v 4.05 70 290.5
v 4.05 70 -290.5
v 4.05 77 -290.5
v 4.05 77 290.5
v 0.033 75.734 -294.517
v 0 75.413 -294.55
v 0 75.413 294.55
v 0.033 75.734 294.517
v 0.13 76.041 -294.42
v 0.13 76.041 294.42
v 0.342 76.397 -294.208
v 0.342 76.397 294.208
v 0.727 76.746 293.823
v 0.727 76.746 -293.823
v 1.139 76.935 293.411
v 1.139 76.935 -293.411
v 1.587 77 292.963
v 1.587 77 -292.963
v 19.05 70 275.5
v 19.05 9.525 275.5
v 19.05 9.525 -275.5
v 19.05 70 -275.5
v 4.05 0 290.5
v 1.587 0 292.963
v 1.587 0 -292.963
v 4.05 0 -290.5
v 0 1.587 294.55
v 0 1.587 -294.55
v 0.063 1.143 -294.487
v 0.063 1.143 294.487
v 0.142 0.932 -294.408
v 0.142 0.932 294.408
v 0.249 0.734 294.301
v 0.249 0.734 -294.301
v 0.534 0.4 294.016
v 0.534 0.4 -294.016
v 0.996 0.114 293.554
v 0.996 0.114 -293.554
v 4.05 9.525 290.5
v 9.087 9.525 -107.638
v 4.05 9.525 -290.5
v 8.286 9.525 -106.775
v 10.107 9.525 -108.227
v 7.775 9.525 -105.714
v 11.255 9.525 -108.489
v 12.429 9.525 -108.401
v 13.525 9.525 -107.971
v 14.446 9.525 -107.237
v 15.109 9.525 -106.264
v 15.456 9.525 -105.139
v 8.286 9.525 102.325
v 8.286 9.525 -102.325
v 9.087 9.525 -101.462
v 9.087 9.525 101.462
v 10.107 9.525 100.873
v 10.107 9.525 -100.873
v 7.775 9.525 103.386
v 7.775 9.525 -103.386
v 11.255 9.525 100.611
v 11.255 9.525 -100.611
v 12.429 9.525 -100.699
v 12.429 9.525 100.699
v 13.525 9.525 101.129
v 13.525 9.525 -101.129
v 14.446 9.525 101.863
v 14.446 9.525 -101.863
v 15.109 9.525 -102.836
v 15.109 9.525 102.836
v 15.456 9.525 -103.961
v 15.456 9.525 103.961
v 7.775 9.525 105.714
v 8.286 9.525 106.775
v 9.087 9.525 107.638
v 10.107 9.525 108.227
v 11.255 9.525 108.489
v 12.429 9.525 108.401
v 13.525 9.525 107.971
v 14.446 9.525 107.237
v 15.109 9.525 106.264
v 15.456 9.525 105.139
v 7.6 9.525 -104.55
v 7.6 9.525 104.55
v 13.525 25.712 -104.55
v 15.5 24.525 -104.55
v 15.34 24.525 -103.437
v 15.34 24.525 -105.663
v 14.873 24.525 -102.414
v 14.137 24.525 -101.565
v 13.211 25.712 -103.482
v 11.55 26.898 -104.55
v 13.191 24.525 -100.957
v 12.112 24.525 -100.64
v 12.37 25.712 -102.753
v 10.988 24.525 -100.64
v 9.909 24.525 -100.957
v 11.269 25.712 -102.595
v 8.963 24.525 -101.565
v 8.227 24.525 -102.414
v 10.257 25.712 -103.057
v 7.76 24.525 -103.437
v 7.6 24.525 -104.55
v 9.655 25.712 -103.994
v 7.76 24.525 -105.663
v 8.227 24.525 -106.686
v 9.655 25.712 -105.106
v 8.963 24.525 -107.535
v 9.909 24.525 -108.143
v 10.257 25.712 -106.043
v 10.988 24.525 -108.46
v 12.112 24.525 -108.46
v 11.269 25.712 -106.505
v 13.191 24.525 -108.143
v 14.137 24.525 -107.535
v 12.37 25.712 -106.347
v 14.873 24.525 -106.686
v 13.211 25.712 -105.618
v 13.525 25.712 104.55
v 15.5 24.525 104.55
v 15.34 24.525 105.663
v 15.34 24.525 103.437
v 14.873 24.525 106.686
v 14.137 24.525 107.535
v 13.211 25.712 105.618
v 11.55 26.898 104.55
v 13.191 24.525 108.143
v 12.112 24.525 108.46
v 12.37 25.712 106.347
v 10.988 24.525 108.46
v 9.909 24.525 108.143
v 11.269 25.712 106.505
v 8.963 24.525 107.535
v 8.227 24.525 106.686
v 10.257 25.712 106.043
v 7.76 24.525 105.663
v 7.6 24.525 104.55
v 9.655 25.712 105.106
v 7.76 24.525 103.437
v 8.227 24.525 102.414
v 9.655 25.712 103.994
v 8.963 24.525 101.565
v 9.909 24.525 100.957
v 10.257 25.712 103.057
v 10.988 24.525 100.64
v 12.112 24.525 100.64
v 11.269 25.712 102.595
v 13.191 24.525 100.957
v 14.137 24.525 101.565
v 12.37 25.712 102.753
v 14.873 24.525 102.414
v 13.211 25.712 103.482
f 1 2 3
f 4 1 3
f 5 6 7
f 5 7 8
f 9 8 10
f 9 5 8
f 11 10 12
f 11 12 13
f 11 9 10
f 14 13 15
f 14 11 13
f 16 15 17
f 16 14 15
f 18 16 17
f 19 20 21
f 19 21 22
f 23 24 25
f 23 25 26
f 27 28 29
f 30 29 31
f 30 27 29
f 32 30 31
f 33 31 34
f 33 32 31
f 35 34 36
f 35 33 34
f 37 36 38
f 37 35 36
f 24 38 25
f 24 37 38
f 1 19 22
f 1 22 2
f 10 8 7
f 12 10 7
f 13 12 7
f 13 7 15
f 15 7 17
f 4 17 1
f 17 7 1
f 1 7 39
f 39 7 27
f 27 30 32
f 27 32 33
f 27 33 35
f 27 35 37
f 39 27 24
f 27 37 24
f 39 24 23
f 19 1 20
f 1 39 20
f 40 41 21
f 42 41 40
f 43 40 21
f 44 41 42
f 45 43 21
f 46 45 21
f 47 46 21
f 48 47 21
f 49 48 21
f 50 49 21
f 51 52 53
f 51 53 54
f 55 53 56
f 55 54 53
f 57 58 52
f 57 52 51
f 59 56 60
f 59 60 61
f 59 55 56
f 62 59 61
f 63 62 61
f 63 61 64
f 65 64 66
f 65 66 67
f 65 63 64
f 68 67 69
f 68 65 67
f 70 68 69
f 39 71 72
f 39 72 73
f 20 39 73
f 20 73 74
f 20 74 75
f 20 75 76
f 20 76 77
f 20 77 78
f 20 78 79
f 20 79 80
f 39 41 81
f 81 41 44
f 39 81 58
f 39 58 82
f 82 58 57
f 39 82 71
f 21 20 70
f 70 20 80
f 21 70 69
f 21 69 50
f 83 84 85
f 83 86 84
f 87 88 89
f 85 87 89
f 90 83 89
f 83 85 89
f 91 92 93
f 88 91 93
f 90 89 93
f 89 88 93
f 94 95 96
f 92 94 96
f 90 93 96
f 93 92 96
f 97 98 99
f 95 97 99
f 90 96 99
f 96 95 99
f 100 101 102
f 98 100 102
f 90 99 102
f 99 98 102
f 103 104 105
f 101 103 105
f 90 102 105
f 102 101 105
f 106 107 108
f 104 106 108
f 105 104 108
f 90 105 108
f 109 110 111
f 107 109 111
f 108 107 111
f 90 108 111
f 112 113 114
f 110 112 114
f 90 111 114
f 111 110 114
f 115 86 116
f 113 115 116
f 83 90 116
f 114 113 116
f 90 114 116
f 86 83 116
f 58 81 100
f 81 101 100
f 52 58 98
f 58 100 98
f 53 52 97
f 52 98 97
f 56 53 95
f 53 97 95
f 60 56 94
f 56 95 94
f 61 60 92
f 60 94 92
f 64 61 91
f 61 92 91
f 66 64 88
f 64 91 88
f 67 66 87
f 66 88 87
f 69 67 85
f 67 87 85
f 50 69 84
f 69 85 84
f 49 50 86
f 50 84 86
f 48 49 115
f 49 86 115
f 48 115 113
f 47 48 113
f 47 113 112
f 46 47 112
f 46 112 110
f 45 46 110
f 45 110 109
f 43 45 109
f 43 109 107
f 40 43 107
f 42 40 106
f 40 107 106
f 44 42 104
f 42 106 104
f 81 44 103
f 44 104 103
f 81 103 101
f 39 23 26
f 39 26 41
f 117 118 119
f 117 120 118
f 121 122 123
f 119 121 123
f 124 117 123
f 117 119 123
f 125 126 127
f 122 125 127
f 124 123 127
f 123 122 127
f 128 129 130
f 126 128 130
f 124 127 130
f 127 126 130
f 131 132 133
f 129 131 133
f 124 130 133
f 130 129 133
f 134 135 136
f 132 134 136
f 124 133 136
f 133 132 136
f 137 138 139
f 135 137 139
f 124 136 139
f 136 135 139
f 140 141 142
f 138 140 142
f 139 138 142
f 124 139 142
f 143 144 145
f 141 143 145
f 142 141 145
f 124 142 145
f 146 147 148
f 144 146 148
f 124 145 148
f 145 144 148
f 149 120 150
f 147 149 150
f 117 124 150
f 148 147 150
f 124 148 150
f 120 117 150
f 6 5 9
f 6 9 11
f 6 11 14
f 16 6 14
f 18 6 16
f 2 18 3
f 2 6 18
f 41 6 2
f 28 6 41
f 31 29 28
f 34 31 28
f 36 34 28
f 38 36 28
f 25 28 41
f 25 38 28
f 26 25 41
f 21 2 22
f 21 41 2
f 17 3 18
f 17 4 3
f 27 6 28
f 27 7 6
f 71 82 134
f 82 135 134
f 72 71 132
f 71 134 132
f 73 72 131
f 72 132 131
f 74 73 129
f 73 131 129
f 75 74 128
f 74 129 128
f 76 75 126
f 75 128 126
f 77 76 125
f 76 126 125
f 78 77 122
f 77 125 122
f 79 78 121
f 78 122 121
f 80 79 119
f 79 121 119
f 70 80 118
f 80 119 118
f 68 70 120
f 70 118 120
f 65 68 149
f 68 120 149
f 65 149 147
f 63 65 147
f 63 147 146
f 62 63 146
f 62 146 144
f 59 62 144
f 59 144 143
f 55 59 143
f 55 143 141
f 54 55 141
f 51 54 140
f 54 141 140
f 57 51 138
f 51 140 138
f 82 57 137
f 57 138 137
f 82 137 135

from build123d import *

# Parameters (mm, degrees)
BOSS_EXTRUDE1_DEPTH            = 294.550000053
FILLET1_R                      = 1.5875
CUT_EXTRUDE1_DEPTH             = 306.043611732
CUT_EXTRUDE1_DEPTH_BACK        = 306.043611732
F_7_9_7_9_DIAMETER_HOLE2_D     = 7.9
F_7_9_7_9_DIAMETER_HOLE2_DEPTH = 15
F_7_9_7_9_DIAMETER_HOLE2_TIP   = 2.373399445


with BuildPart() as part:
    # Sketch1 → Boss-Extrude1 (new, symmetric)
    with BuildSketch(Plane.XY):
        Polygon((0, 77.000000178), (0, 0), (4.050000028, 0), (4.050000028, 9.525), (19.05, 9.525), (19.05, 70.000000208), (4.050000028, 70.000000208), (4.050000028, 77.000000178), align=None)
    extrude(amount=BOSS_EXTRUDE1_DEPTH, both=True)

    # Fillet1
    fillet1_edges = [part.edges().sort_by_distance(p)[0] for p in [
        (0, 0, 0),
        (0, 77.000000178, 0),
    ]]
    fillet(fillet1_edges, radius=FILLET1_R)

    # Sketch2 → Cut-Extrude1 (cut, two sides: drawn at the far end of the back side and taken through both)
    with BuildSketch(Plane(origin=(0, 77.000000178, 0), x_dir=(1, 0, 0), z_dir=(0, 1, 0)).offset(-CUT_EXTRUDE1_DEPTH_BACK)):
        Polygon((0, 294.550000053), (19.05, 275.500000053), (19.05, 294.550000053), align=None)
        Polygon((19.05, -275.500000053), (19.05, -294.550000053), (0, -294.550000053), align=None)
    extrude(amount=CUT_EXTRUDE1_DEPTH + CUT_EXTRUDE1_DEPTH_BACK, mode=Mode.SUBTRACT)

    # Ø7.9 (7.9) Diameter Hole2
    with Locations(Plane.XZ.offset(-9.525)):
        with Locations((11.550000014, -104.550000053), (11.550000014, 104.550000053)):
            Hole(F_7_9_7_9_DIAMETER_HOLE2_D / 2, depth=F_7_9_7_9_DIAMETER_HOLE2_DEPTH)
            with Locations((0, 0, -(F_7_9_7_9_DIAMETER_HOLE2_DEPTH + F_7_9_7_9_DIAMETER_HOLE2_TIP / 2))):  # 118° drill point
                Cone(0, F_7_9_7_9_DIAMETER_HOLE2_D / 2, F_7_9_7_9_DIAMETER_HOLE2_TIP, mode=Mode.SUBTRACT)


solid = part.part
